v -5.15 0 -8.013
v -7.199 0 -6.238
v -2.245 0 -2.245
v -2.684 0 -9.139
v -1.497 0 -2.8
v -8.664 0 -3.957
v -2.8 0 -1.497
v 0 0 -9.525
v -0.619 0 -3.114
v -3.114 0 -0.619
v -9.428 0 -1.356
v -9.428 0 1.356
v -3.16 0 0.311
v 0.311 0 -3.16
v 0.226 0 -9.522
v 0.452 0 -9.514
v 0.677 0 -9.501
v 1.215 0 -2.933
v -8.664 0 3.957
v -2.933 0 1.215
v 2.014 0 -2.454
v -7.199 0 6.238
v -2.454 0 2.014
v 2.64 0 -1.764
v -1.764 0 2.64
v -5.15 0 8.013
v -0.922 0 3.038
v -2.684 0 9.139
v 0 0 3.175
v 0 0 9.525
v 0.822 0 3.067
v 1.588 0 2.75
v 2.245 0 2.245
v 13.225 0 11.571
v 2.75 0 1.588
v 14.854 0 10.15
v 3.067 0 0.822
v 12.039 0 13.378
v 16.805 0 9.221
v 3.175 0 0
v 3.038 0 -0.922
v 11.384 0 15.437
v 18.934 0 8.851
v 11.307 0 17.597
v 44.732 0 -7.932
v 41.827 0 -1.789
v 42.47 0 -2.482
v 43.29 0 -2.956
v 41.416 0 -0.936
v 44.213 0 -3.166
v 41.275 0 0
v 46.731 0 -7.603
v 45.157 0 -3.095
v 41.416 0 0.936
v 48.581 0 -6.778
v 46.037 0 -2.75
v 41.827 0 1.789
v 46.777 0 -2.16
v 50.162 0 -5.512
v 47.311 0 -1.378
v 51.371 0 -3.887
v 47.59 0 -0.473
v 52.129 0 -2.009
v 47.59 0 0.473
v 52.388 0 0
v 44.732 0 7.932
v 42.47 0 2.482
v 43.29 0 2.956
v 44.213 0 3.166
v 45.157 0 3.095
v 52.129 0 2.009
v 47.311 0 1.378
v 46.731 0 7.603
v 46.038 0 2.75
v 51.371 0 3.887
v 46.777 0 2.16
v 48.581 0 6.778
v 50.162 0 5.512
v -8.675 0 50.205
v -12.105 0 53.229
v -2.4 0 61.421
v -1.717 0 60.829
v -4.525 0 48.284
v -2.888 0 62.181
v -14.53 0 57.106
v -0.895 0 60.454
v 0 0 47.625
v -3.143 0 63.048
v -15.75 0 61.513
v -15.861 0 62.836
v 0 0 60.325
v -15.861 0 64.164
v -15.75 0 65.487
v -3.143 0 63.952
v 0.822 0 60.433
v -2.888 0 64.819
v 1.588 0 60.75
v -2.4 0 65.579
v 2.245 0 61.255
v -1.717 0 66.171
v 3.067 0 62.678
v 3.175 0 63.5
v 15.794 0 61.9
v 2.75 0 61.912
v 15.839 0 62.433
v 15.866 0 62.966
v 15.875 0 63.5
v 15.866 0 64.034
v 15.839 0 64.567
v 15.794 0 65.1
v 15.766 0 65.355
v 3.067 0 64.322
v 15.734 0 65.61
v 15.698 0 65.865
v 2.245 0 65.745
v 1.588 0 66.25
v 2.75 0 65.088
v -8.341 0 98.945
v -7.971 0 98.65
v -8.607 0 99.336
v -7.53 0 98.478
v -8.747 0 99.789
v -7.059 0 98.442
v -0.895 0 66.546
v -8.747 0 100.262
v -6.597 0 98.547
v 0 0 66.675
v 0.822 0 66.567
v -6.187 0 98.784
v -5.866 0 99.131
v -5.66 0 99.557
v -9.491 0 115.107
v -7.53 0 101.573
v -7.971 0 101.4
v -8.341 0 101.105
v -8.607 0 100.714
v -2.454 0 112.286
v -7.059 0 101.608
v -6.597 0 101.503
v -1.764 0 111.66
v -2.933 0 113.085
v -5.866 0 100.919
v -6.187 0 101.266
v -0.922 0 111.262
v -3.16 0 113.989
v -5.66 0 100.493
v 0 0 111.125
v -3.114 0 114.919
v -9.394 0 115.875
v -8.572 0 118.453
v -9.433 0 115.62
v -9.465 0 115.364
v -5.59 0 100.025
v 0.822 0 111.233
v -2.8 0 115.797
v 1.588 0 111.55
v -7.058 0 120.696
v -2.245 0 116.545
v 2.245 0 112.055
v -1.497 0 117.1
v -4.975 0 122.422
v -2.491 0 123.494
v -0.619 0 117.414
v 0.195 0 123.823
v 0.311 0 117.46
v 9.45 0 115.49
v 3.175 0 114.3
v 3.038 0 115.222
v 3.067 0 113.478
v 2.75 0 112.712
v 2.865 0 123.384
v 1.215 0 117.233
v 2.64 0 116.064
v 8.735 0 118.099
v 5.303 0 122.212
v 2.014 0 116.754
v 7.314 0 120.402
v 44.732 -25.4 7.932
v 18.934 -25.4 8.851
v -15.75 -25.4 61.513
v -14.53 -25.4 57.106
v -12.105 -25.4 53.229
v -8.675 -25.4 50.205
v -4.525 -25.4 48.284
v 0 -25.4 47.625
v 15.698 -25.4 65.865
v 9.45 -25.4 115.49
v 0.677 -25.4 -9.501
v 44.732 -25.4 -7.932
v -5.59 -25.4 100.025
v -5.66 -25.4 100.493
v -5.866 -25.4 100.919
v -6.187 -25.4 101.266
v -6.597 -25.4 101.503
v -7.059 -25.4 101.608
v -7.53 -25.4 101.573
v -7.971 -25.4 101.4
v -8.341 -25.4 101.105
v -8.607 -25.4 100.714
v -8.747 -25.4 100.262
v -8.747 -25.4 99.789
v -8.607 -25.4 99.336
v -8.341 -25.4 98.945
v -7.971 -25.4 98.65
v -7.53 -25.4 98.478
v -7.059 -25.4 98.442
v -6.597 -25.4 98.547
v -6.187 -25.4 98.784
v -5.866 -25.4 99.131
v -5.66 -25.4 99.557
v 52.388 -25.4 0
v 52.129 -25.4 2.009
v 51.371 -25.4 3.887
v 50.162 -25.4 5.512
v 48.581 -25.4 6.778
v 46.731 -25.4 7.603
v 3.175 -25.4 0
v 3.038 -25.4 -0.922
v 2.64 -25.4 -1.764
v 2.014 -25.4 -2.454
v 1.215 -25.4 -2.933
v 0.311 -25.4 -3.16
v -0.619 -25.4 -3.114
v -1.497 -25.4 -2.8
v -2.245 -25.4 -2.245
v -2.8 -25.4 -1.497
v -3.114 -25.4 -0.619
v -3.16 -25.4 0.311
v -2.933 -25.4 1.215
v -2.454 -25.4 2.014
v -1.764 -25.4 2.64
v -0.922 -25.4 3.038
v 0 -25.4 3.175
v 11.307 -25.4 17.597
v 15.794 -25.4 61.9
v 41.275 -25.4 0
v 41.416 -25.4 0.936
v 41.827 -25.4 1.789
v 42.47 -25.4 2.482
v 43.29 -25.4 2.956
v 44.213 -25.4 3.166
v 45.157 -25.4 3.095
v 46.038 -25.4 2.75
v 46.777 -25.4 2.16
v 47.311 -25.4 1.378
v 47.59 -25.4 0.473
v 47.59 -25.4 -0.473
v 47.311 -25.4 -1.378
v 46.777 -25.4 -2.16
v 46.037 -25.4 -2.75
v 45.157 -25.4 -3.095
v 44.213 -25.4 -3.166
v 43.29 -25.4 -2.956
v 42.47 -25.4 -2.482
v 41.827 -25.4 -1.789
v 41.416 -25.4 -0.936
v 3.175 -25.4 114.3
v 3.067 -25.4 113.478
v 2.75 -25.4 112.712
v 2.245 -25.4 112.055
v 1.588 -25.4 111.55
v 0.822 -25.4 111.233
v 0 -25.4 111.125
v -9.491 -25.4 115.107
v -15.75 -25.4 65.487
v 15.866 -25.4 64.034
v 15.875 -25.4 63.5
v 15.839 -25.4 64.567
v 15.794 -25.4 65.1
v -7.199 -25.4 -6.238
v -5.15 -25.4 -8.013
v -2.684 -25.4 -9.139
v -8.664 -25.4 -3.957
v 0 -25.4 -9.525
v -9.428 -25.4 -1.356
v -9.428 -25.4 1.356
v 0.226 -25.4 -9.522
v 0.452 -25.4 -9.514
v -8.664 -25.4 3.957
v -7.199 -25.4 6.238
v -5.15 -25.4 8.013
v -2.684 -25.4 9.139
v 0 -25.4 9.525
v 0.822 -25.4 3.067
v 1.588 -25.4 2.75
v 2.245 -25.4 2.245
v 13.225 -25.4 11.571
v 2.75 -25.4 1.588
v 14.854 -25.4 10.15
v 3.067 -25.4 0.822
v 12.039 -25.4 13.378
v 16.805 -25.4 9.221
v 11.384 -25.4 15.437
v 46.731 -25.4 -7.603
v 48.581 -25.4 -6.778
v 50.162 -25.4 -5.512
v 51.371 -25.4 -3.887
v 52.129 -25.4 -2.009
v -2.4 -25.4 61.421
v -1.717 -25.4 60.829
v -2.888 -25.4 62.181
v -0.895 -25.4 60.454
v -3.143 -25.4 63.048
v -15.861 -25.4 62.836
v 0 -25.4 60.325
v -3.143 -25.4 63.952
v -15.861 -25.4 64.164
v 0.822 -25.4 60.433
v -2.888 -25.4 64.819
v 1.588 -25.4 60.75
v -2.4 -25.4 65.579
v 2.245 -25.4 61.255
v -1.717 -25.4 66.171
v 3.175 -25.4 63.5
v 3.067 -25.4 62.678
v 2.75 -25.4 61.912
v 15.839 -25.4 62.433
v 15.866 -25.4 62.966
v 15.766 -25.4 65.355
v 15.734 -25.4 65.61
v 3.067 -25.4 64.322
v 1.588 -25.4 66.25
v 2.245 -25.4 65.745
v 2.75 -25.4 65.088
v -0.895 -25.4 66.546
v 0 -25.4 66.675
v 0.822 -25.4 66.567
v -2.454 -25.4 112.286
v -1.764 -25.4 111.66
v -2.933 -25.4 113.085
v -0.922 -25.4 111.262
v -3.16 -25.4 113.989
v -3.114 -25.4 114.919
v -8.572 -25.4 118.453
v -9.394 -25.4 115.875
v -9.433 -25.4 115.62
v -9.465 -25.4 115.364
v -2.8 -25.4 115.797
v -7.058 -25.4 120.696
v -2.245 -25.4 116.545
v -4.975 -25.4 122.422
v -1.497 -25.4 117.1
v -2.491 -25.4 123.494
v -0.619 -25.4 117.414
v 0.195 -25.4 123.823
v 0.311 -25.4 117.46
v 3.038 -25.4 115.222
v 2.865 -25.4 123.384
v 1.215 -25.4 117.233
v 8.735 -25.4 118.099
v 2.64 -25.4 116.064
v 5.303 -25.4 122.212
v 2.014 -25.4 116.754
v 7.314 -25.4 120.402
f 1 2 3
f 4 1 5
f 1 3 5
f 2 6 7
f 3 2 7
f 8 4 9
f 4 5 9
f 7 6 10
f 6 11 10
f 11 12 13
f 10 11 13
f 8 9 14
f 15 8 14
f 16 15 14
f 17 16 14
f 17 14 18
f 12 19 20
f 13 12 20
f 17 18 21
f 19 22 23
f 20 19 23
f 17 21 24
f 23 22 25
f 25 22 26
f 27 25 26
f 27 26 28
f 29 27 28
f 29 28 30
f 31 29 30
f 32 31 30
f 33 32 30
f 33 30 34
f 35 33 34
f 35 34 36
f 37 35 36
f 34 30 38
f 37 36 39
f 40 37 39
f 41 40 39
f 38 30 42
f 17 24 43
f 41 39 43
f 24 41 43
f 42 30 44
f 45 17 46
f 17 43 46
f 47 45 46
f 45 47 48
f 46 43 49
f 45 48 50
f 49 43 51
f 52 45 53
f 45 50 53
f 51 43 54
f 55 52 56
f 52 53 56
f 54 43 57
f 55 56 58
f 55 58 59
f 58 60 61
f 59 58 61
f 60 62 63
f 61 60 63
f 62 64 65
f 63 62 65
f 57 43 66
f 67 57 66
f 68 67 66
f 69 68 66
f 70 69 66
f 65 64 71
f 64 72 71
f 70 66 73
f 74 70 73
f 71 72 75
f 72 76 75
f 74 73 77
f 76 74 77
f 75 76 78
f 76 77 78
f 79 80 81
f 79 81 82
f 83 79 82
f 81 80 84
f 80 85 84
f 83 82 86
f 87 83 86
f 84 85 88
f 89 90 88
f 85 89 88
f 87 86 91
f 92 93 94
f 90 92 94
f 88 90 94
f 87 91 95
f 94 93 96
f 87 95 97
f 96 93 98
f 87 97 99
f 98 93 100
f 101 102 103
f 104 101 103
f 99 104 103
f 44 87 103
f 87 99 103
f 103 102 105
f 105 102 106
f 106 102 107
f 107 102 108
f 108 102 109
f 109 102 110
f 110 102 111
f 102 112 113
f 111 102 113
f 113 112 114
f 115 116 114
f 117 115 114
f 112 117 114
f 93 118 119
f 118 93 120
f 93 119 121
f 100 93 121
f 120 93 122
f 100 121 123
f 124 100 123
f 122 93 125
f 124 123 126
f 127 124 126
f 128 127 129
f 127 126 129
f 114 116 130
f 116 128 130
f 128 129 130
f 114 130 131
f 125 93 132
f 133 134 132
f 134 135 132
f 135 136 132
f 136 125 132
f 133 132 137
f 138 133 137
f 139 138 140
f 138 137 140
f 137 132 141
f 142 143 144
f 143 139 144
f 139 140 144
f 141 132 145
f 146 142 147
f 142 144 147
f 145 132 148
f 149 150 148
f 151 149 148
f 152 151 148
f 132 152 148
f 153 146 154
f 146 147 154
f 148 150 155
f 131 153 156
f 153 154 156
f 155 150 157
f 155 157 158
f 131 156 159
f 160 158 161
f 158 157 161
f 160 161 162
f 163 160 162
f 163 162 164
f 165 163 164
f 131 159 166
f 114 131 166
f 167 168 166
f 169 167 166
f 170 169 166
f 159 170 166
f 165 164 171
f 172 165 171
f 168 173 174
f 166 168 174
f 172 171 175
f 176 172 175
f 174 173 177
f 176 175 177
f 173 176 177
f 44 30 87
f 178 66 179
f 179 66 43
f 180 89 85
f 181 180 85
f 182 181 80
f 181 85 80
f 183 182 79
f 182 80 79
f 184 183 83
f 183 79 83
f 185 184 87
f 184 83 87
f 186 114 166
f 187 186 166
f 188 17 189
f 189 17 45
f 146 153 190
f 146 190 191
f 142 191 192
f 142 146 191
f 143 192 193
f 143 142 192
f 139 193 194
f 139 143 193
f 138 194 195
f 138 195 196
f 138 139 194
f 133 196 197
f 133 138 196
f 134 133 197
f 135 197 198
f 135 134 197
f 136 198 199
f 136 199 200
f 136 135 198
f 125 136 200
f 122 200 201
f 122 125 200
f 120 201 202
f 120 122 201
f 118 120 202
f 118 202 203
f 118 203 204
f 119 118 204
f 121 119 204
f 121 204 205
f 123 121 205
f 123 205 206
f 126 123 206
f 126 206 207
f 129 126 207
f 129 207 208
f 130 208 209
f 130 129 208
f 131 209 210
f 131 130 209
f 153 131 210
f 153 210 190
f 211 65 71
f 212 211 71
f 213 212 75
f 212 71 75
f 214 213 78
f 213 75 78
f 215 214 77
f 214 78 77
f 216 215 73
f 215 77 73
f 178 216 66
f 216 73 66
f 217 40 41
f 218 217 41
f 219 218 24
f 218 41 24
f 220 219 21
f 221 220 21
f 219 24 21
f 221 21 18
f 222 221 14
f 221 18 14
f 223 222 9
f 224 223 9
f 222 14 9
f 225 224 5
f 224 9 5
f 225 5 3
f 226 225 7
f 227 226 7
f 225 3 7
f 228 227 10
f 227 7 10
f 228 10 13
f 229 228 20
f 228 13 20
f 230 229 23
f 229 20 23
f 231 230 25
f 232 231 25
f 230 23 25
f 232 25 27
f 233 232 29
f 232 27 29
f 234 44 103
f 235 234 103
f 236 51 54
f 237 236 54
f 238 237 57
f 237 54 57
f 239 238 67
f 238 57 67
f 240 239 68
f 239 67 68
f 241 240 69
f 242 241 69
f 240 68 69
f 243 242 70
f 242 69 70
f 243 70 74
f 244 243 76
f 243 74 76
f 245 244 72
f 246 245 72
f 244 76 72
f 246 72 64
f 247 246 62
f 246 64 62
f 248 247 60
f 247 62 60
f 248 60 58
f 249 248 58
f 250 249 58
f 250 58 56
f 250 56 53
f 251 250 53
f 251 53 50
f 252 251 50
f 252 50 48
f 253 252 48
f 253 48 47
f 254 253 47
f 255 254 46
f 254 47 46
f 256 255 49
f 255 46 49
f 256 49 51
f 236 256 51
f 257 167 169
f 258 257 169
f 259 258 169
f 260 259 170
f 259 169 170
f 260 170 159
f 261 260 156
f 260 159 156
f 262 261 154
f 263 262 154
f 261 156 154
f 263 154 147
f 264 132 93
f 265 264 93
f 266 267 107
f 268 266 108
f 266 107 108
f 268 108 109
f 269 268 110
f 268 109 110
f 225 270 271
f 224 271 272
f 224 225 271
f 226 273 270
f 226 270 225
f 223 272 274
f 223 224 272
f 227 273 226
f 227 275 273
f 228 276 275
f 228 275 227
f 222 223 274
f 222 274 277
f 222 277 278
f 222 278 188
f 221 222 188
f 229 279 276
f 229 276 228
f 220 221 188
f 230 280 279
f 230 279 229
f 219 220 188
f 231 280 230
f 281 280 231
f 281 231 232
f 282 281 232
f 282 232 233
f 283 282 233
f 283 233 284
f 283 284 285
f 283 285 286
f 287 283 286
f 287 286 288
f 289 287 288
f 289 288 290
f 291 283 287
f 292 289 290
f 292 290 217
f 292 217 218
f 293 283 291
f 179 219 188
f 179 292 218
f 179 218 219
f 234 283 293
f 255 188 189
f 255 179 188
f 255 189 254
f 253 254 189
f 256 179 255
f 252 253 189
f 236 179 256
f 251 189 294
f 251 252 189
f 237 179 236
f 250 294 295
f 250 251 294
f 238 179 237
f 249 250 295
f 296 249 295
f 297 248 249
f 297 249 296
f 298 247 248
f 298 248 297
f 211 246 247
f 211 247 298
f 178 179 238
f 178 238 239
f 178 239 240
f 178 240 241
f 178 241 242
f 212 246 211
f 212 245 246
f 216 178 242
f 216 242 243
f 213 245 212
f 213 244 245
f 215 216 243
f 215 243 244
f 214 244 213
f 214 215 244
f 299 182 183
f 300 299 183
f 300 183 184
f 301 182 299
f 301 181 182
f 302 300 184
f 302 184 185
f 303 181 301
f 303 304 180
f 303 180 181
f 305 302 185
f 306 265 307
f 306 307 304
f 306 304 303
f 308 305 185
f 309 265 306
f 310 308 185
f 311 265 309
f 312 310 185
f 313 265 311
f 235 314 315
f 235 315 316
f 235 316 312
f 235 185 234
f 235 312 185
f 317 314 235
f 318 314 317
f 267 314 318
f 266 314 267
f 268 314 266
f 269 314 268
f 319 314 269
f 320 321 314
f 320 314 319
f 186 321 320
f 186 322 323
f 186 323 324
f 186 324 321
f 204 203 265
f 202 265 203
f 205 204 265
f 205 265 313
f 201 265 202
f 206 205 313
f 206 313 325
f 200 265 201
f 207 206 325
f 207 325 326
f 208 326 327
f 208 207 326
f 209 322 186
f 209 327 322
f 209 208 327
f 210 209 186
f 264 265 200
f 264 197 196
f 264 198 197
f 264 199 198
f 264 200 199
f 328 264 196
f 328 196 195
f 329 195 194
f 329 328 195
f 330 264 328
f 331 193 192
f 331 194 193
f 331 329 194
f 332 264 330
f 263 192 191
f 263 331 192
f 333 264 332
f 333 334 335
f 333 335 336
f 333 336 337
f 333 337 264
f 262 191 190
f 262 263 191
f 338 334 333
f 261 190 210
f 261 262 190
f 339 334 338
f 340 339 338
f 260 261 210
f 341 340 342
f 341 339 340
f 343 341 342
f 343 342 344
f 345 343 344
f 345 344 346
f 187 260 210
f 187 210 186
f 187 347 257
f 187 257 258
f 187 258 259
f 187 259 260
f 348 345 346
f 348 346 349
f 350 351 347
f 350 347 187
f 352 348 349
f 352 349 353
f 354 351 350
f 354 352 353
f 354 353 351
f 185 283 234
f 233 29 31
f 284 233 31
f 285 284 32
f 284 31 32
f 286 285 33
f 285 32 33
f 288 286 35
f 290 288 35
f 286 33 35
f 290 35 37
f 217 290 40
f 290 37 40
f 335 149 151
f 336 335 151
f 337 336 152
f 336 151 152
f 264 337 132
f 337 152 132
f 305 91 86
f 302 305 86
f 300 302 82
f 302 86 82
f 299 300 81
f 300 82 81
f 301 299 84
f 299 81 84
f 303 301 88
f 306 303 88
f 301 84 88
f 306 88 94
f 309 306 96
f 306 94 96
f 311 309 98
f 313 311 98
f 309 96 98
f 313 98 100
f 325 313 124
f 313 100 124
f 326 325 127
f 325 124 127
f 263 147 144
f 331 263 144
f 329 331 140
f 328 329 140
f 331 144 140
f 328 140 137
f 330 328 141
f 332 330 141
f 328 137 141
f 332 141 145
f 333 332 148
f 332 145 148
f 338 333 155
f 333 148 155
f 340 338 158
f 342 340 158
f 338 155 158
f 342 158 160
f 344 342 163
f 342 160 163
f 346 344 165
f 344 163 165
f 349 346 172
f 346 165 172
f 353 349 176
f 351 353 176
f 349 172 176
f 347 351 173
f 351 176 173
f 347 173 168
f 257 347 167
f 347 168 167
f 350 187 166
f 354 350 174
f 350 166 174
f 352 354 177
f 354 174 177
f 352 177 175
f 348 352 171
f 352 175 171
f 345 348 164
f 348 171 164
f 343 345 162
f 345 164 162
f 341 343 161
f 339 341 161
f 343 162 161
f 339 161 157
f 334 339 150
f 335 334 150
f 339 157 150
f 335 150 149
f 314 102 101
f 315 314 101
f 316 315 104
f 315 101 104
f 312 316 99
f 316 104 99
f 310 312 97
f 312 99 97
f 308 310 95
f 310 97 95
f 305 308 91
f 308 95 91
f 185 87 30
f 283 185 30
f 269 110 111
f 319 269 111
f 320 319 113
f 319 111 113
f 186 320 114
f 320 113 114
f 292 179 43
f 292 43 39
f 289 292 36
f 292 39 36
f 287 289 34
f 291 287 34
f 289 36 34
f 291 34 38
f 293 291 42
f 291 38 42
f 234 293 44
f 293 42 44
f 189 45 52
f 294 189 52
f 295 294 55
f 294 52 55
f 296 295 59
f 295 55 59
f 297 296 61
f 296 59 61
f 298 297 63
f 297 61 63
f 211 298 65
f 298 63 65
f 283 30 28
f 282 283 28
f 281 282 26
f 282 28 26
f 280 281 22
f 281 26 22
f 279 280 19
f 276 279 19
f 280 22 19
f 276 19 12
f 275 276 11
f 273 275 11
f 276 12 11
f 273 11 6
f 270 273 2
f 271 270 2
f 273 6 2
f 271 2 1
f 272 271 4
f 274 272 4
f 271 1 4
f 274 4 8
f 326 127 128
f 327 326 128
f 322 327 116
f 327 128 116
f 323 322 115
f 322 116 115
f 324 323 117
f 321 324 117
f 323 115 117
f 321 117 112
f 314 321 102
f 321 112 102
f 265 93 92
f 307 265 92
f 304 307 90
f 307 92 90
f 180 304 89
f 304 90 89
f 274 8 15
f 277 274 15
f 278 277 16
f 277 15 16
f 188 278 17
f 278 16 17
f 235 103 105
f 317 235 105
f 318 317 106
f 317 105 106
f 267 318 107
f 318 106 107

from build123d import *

# Parameters (mm, degrees)
F0_R     = 1.5875
F1_DEPTH = 25.4


with BuildPart() as f1:
    # F0 (on Front) → F1 (new body)
    with BuildSketch(Plane.XZ):
        with BuildLine():
            Line((3.175, 0), (9.525, 0))
            ThreePointArc((9.525, 0), (6.7351920908, 6.7351920908), (0, 9.525))
            Line((0, 9.525), (0, 3.175))
            ThreePointArc((0, 3.175), (2.2450640303, 2.2450640303), (3.175, 0))
        make_face()
        with BuildLine():
            Line((36.5125, 0), (9.525, 0))
            ThreePointArc((9.525, 0), (6.9705567315, -6.4912990883), (0.6773435479, -9.500885786))
            Line((0.6773435479, -9.500885786), (44.7324052746, -7.9324746146))
            ThreePointArc((44.7324052746, -7.9324746146), (38.9380895153, -5.7116327839), (36.5125, 0))
        make_face()
        with BuildLine():
            ThreePointArc((0.6773435479, -9.500885786), (6.9705567315, -6.4912990883), (9.525, 0))
            Line((9.525, 0), (3.175, 0))
            ThreePointArc((3.175, 0), (-2.2450640303, -2.2450640303), (0, 3.175))
            Line((0, 3.175), (0, 9.525))
            ThreePointArc((0, 9.525), (-9.525, 0), (0, -9.525))
            Line((0, -9.525), (0.6773435479, -9.500885786))
        make_face()
        with BuildLine():
            ThreePointArc((0, 9.525), (6.7351920908, 6.7351920908), (9.525, 0))
            Line((9.525, 0), (36.5125, 0))
            ThreePointArc((36.5125, 0), (38.9380895153, 5.7116327839), (44.7324052746, 7.9324746146))
            Line((44.7324052746, 7.9324746146), (18.9341027877, 8.850924033))
            ThreePointArc((18.9341027877, 8.850924033), (13.2249738114, 11.5709798305), (11.3072231466, 17.5971800924))
            Line((11.3072231466, 17.5971800924), (15.7942028036, 61.9003804205))
            ThreePointArc((15.7942028036, 61.9003804205), (10.644756084, 51.722700101), (0, 47.625))
            Line((0, 47.625), (0, 9.525))
        make_face()
        with BuildLine():
            ThreePointArc((0, -9.525), (0.3388863295, -9.5189695375), (0.6773435479, -9.500885786))
            Line((0.6773435479, -9.500885786), (0, -9.525))
        make_face()
        with BuildLine():
            ThreePointArc((44.7324052746, 7.9324746146), (38.9380895153, 5.7116327839), (36.5125, 0))
            ThreePointArc((36.5125, 0), (38.9380895153, -5.7116327839), (44.7324052746, -7.9324746146))
            ThreePointArc((44.7324052746, -7.9324746146), (50.1616327839, -5.5119104847), (52.3875, 0))
            ThreePointArc((52.3875, 0), (50.1616327839, 5.5119104847), (44.7324052746, 7.9324746146))
        make_face()
        with BuildLine():
            ThreePointArc((47.625, 0), (44.45, -3.175), (41.275, 0))
            ThreePointArc((41.275, 0), (44.45, 3.175), (47.625, 0))
        make_face(mode=Mode.SUBTRACT)
        with BuildLine():
            Line((0, 60.325), (0, 47.625))
            ThreePointArc((0, 47.625), (10.644756084, 51.722700101), (15.7942028036, 61.9003804205))
            Line((15.7942028036, 61.9003804205), (15.7942028036, 65.0996195795))
            Line((15.7942028036, 65.0996195795), (15.6978424192, 65.8650303134))
            ThreePointArc((15.6978424192, 65.8650303134), (10.3554519161, 75.5324661069), (0, 79.375))
            Line((0, 79.375), (0, 66.675))
            ThreePointArc((0, 66.675), (2.2450640303, 65.7450640303), (3.175, 63.5))
            ThreePointArc((3.175, 63.5), (2.2450640303, 61.2549359697), (0, 60.325))
        make_face()
        with BuildLine():
            ThreePointArc((-15.7501779217, 61.5131632086), (-10.4993950049, 51.5929294311), (0, 47.625))
            Line((0, 47.625), (0, 60.325))
            ThreePointArc((0, 60.325), (-3.175, 63.5), (0, 66.675))
            Line((0, 66.675), (0, 79.375))
            ThreePointArc((0, 79.375), (-10.4993950049, 75.4070705689), (-15.7501779217, 65.4868367914))
            Line((-15.7501779217, 65.4868367914), (-15.7501779217, 61.5131632086))
        make_face()
        with BuildLine():
            ThreePointArc((-15.7501779217, 65.4868367914), (-15.875, 63.5), (-15.7501779217, 61.5131632086))
            Line((-15.7501779217, 61.5131632086), (-15.7501779217, 65.4868367914))
        make_face()
        with BuildLine():
            Line((15.7942028036, 65.0996195795), (15.7942028036, 61.9003804205))
            ThreePointArc((15.7942028036, 61.9003804205), (15.8547878338, 62.6991705884), (15.875, 63.5))
            ThreePointArc((15.875, 63.5), (15.8547878338, 64.3008294116), (15.7942028036, 65.0996195795))
        make_face()
        with BuildLine():
            Line((-9.4907647262, 115.1068518528), (-15.7501779217, 65.4868367914))
            ThreePointArc((-15.7501779217, 65.4868367914), (-10.4993950049, 75.4070705689), (0, 79.375))
            Line((0, 79.375), (0, 104.775))
            ThreePointArc((0, 104.775), (-7.0146592539, 107.8563845125), (-9.4907647262, 115.1068518528))
        make_face()
        with Locations((-7.1771577932, 100.0252)):
            Circle(F0_R, mode=Mode.SUBTRACT)
        with BuildLine():
            Line((15.6978424192, 65.8650303134), (15.7942028036, 65.0996195795))
            ThreePointArc((15.7942028036, 65.0996195795), (15.7506727309, 65.4829103672), (15.6978424192, 65.8650303134))
        make_face()
        with BuildLine():
            Line((0, 104.775), (0, 79.375))
            ThreePointArc((0, 79.375), (10.3554519161, 75.5324661069), (15.6978424192, 65.8650303134))
            Line((15.6978424192, 65.8650303134), (9.4504036385, 115.4897462203))
            ThreePointArc((9.4504036385, 115.4897462203), (9.5063326172, 114.8960412498), (9.525, 114.3))
            ThreePointArc((9.525, 114.3), (6.7351920908, 107.5648079092), (0, 104.775))
        make_face()
        with BuildLine():
            Line((-9.393817197, 115.8753804205), (-9.4907647262, 115.1068518528))
            ThreePointArc((-9.4907647262, 115.1068518528), (-7.0146592539, 107.8563845125), (0, 104.775))
            ThreePointArc((0, 104.775), (6.7351920908, 107.5648079092), (9.525, 114.3))
            ThreePointArc((9.525, 114.3), (9.5063326172, 114.8960412498), (9.4504036385, 115.4897462203))
            ThreePointArc((9.4504036385, 115.4897462203), (0.1948818628, 123.8230061461), (-9.393817197, 115.8753804205))
        make_face()
        with BuildLine():
            ThreePointArc((3.175, 114.3), (2.2450640303, 112.0549359697), (0, 111.125))
            ThreePointArc((0, 111.125), (-2.2450640303, 116.5450640303), (3.175, 114.3))
        make_face(mode=Mode.SUBTRACT)
        with BuildLine():
            ThreePointArc((-9.393817197, 115.8753804205), (-9.450106753, 115.4921020748), (-9.4907647262, 115.1068518528))
            Line((-9.4907647262, 115.1068518528), (-9.393817197, 115.8753804205))
        make_face()
    extrude(amount=F1_DEPTH)


solid = f1.part
